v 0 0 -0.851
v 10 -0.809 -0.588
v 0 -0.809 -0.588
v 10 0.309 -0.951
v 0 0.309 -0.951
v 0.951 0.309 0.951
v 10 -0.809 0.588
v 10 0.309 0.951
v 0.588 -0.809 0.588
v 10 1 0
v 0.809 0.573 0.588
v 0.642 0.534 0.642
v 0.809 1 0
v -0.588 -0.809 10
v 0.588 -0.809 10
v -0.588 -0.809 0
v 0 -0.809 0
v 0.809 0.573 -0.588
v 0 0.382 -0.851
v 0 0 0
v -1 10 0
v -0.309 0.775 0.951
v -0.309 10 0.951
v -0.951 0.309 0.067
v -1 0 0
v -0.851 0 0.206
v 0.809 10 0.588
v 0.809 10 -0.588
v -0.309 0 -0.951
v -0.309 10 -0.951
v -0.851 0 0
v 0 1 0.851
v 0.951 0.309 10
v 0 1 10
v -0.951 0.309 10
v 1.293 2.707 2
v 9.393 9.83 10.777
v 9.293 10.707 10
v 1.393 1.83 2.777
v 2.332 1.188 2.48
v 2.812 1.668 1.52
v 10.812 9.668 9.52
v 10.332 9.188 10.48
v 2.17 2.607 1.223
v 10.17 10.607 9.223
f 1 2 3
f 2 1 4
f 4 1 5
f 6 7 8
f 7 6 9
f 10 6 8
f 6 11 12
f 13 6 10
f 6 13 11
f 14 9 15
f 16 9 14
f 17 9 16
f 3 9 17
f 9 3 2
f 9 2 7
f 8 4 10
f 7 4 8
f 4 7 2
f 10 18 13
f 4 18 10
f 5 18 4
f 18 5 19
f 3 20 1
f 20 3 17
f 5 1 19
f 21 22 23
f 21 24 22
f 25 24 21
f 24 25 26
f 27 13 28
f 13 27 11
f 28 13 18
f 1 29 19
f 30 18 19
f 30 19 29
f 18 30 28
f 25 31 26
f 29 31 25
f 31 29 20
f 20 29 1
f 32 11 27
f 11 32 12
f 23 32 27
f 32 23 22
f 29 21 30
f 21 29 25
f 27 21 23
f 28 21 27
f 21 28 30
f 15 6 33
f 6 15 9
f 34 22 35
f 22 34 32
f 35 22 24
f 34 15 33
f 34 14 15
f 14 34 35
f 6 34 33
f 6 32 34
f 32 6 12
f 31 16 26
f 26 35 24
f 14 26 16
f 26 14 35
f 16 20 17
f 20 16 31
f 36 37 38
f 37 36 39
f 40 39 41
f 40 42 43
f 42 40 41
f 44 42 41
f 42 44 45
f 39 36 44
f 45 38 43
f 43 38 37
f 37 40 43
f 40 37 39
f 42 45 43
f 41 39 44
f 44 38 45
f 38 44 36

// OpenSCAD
// file: maths.scad
//===================================== 
// This is public Domain Code
// Contributed by: William A Adams
// May 2011
//=====================================

/*
	A set of math routines for graphics calculations

	There are many sources to draw from to create the various math
	routines required to support a graphics library.  The routines here
	were created from scratch, not borrowed from any particular 
	library already in existance.

	One great source for inspiration is the book:
		Geometric Modeling
		Author: Michael E. Mortenson

	This book has many great explanations about the hows and whys
	of geometry as it applies to modeling.

	As this file may accumulate quite a lot of routines, you can either
	include it whole in your OpenScad files, or you can choose to 
	copy/paste portions that are relevant to your particular situation.

	It is public domain code, simply to avoid any licensing issues.
*/

//=======================================
//				Constants
//=======================================
CGoldenRatio = 1.618; 

//=======================================
//
// 				Point Routines
//
//=======================================

// Create a point
function Point2D_Create(u,v) = [u,v]; 
function Point3D_Create(u,v,w) = [u,v,w];

//=======================================
//
// 				Vector Routines
//
//=======================================

// Basic vector routines
// Sum of two vectors
function VSUM(v1, v2) = [v1[0]+v2[0], v1[1]+v2[1], v1[2]+v2[2]];
function VSUB(v1, v2) = [v1[0]-v2[0], v1[1]-v2[1], v1[2]-v2[2]];

function VMULT(v1, v2) = [v1[0]*v2[0], v1[1]*v2[1], v1[2]*v2[2]];

// Magnitude of a vector
// Gives the Euclidean norm
function VLENSQR(v) = (v[0]*v[0]+v[1]*v[1]+v[2]*v[2]);
function VLEN(v) = sqrt(VLENSQR(v));
function VMAG(v) = sqrt(v[0]*v[0]+v[1]*v[1]+v[2]*v[2]);


// Returns the unit vector associated with a vector
function VUNIT(v) = v/VMAG(v);
function VNORM(v) = v/VMAG(v);

// The scalar, or 'dot' product
// law of cosines
// if VDOT(v1,v2) == 0, they are perpendicular
function SPROD(v1,v2) = v1[0]*v2[0]+v1[1]*v2[1]+v1[2]*v2[2];
function VDOT(v1v2) = SPROD(v1v2[0], v1v2[1]);

// The vector, or Cross product
// Given an array that contains two vectors
function VPROD(vs) = [
	(vs[0][1]*vs[1][2])-(vs[1][1]*vs[0][2]), 
	(vs[0][2]*vs[1][0])-(vs[1][2]*vs[0][0]),
	(vs[0][0]*vs[1][1])-(vs[1][0]*vs[0][1])];
function VCROSS(v1, v2) = VPROD([v1,v2]);

// Calculate the angle between two vectors
function VANG(v1, v2) = acos(VDOT([v1,v2])/(VMAG(v1)*VMAG(v2)));

// Calculate the rotations necessary to take a polygon, and apply 
// the rotate() transform, and get the polygon to be perpendicular to 
// the specified vector.
function rotations(v) = [ 
	VANG([0,1,0], [0,v[1],v[2]]), 
	VANG([0,0,-1], [v[0],0,v[2]]), 
	VANG([1,0,0], [v[0], v[1],0])];

// Get the appropriate rotations to place a cylinder in world space 
// This is helpful when trying to place a 'line segment' in space
// Book: Essential Mathematics for Games and Interactive Applications (p.75)
function LineRotations(v) = [
	atan2(sqrt(v[0]*v[0]+v[1]*v[1]), v[2]), 
	0, 
	atan2(v[1], v[0])+90];

// The following are already provided in OpenScad, but are
// here for completeness
function VMULTS(v, s) = [v[0]*s, v[1]*s, v[2]*s];
function VDIVS(v,s) = [v[0]/s, v[1]/s, v[2]/s];
function VADDS(v,s) = [v[0]+s, v[1]+s, v[2]+s];
function VSUBS(v,s) = [v[0]-s, v[1]-s, v[2]-s];


// Some more convenience routines.  Not found in OpenScad, but primarily using OpenScad routines
function VMIN(v1,v2) = [min(v1[0],v2[0]), min(v1[1],v2[1]), min(v1[2], v2[2])];
function VMIN3(v1, v2, v3) = VMIN(VMIN(v1,v2),v3);
function VMIN4(v1, v2, v3, v4) = VMIN(VMIN3(v1, v2, v3), v4);

function VMAX(v1,v2) = [max(v1[0],v2[0]), max(v1[1],v2[1]), max(v1[2], v2[2])];
function VMAX3(v1, v2, v3) = VMAX(VMAX(v1,v2),v3);
function VMAX4(v1, v2, v3, v4) = VMAX(VMAX(v1, v2, v3), v4);


//=======================================
//
// 			MATRIX Routines
//
//=======================================

function MADD2X2(m1, m2) = [
	[m1[0][0]+m2[0][0],  m1[0][1]+m2[0][1]],
	[m1[1][2]+m2[1][0],  m1[1][1]+m2[1][1]]];

// Returns the determinant of a 2X2 matrix
// Matrix specified in row major order
function DETVAL2X2(m) = m[0[0]]*m[1[1]] - m[0[1]]*m[1[0]];

// Returns the determinant of a 3X3 matrix
function DETVAL(m) = 
	m[0[0]]*DETVAL2X2([ [m[1[1]],m[1[2]]], [m[2[1]],m[2[2]]] ]) - 
	m[0[1]]*DETVAL2X2([ [m[1[0]],m[1[2]]], [m[2[0]],m[2[2]]] ]) + 
	m[0[2]]*DETVAL2X2([ [m[1[0]],m[1[1]]], [m[2[0]],m[2[1]]] ]);

//=======================================
//
// 			Helper Routines
//
//=======================================

function AvgThree(v1,v2,v3) = (v1+v2+v3)/3; 
function AvgFour(v1,v2,v3,v4) = (v1+v2+v3+v4)/4;

function CenterOfGravity3(p0, p1, p2) = [
	AvgThree(p0[0], p1[0], p2[0]), 
	AvgThree(p0[1], p1[1], p2[1]), 
	AvgThree(p0[2], p1[2], p2[2])];
function CenterOfGravity4(p0, p1, p2, p3) = [
	AvgThree(p0[0], p1[0], p2[0], p3[0]), 
	AvgThree(p0[1], p1[1], p2[1], p3[1]), 
	AvgThree(p0[2], p1[2], p2[2], p3[2])];

function lerp1(u, p0, p1) = (1-u)*p0 + u*p1;
function lerp(u, v1, v2) = [
	lerp1(u, v1[0], v2[0]),
	lerp1(u, v1[1], v2[2]),
	lerp1(u, v1[2], v2[2])
	];

 
// main file
//===================================== 
// This is public Domain Code
// Contributed by: William A Adams
// May 2011
//=====================================

include <maths.scad>


//=======================================
//	Functions
//=======================================
function LineRotations(v) = [atan2(sqrt(v[0]*v[0]+v[1]*v[1]), v[2]), 0, atan2(v[1], v[0])+90];

function parseSeg(seg) = [
	seg[0], 
	LineRotations(seg[1]-seg[0]), 
	VMAG(seg[1]-seg[0])
	];

//=======================================
// Test cases
//=======================================
testvector();
//testrotation();

//placeLine([[0,0,0], [0,10,0]]);
//testgetrot();

module testgetrot()
{
	v = [10,10,5];

	// Length
	phi = VMAG(v);

	// X - rotation
	rho = atan2(sqrt(v[0]*v[0]+v[1]*v[1]), v[2]);

	// Z - rotation
	theta = atan2(v[1], v[0]);

echo("PHI: ", phi);
echo("THETA: ", theta);
echo("RHO: ", rho);

	//rotate([45,0,90])
	//rotate([rho, 0, theta+90])
	rotate(getrot(v))
	cylinder(r=1, h=phi);
}

module placeLine(seg)
{
	params = parseSeg(seg);

echo("Segment: ", params);

	origin = params[0];
	rot = params[1];
	len = params[2];

//echo("ORIGIN ", params[0]);
echo("ROTATION: ", rot);
echo("LENGTH: ",len);

	translate(origin)
	rotate(rot)
	cylinder(r=1, h=len);
}

module testrotation()
{
	lowangle = 0;
	highangle = 45;
	steps = 1;
	len = 10;

	for (step = [0:steps])
	{
		assign(theta = lowangle +  (highangle-lowangle)*step/steps)
		{
			assign(x = len*sin(theta))
			assign(y = len*cos(theta))
			{
echo("X,Y: ", x, y);
echo("THETA: ", theta);
				//rotate([0,theta,0])
				//cylinder(r=1, h=len);

				placeLine([[0,0,0],[x,y,y]]);
			}
		}
	}
}

module testvector()
{
//	placeLine( [[2,2,2],[10,10,10]]);
//	placeLine( [[2,2,2],[5,10,10]]);

len = VMAG([0,10,0]);
echo("LEN: ", len);

	// Rotations in X-Z plane
	color([1,0,0]) placeLine([[0,0,0], [10,0,0]]);
//	color([1,0,0]) placeLine([[0,0,0], [10,0,10]]);

	color([0,1,0]) placeLine([[0,0,0], [0,10,0]]);
	color([0,0,1]) placeLine([[0,0,0], [0,0,10]]);

	placeLine([[2,2,2], [10,10,10]]);
//
//	echo("VANG x, [10,10,0]: ", VANG([1,0,0], [10,10,0]));
//
//	echo("VANG [0,0,0], [10,10,0]: ", VANG([0,0,0], [10,10,0]));
//
//	echo("VANG [1,1,1], [10,10,0]: ", VANG([1,1,1], [10,10,0]));

//	echo("VANG [1,0,0], [10,10,10]: ", VANG([1,0,0], [10,10,0]));
//	echo("VANG [0,1,0], [10,10,10]: ", VANG([0,1,0], [10,10,10]));
//	echo("VANG [0,0,1], [10,10,10]: ", VANG([0,0,1], [10,10,10]));

}
